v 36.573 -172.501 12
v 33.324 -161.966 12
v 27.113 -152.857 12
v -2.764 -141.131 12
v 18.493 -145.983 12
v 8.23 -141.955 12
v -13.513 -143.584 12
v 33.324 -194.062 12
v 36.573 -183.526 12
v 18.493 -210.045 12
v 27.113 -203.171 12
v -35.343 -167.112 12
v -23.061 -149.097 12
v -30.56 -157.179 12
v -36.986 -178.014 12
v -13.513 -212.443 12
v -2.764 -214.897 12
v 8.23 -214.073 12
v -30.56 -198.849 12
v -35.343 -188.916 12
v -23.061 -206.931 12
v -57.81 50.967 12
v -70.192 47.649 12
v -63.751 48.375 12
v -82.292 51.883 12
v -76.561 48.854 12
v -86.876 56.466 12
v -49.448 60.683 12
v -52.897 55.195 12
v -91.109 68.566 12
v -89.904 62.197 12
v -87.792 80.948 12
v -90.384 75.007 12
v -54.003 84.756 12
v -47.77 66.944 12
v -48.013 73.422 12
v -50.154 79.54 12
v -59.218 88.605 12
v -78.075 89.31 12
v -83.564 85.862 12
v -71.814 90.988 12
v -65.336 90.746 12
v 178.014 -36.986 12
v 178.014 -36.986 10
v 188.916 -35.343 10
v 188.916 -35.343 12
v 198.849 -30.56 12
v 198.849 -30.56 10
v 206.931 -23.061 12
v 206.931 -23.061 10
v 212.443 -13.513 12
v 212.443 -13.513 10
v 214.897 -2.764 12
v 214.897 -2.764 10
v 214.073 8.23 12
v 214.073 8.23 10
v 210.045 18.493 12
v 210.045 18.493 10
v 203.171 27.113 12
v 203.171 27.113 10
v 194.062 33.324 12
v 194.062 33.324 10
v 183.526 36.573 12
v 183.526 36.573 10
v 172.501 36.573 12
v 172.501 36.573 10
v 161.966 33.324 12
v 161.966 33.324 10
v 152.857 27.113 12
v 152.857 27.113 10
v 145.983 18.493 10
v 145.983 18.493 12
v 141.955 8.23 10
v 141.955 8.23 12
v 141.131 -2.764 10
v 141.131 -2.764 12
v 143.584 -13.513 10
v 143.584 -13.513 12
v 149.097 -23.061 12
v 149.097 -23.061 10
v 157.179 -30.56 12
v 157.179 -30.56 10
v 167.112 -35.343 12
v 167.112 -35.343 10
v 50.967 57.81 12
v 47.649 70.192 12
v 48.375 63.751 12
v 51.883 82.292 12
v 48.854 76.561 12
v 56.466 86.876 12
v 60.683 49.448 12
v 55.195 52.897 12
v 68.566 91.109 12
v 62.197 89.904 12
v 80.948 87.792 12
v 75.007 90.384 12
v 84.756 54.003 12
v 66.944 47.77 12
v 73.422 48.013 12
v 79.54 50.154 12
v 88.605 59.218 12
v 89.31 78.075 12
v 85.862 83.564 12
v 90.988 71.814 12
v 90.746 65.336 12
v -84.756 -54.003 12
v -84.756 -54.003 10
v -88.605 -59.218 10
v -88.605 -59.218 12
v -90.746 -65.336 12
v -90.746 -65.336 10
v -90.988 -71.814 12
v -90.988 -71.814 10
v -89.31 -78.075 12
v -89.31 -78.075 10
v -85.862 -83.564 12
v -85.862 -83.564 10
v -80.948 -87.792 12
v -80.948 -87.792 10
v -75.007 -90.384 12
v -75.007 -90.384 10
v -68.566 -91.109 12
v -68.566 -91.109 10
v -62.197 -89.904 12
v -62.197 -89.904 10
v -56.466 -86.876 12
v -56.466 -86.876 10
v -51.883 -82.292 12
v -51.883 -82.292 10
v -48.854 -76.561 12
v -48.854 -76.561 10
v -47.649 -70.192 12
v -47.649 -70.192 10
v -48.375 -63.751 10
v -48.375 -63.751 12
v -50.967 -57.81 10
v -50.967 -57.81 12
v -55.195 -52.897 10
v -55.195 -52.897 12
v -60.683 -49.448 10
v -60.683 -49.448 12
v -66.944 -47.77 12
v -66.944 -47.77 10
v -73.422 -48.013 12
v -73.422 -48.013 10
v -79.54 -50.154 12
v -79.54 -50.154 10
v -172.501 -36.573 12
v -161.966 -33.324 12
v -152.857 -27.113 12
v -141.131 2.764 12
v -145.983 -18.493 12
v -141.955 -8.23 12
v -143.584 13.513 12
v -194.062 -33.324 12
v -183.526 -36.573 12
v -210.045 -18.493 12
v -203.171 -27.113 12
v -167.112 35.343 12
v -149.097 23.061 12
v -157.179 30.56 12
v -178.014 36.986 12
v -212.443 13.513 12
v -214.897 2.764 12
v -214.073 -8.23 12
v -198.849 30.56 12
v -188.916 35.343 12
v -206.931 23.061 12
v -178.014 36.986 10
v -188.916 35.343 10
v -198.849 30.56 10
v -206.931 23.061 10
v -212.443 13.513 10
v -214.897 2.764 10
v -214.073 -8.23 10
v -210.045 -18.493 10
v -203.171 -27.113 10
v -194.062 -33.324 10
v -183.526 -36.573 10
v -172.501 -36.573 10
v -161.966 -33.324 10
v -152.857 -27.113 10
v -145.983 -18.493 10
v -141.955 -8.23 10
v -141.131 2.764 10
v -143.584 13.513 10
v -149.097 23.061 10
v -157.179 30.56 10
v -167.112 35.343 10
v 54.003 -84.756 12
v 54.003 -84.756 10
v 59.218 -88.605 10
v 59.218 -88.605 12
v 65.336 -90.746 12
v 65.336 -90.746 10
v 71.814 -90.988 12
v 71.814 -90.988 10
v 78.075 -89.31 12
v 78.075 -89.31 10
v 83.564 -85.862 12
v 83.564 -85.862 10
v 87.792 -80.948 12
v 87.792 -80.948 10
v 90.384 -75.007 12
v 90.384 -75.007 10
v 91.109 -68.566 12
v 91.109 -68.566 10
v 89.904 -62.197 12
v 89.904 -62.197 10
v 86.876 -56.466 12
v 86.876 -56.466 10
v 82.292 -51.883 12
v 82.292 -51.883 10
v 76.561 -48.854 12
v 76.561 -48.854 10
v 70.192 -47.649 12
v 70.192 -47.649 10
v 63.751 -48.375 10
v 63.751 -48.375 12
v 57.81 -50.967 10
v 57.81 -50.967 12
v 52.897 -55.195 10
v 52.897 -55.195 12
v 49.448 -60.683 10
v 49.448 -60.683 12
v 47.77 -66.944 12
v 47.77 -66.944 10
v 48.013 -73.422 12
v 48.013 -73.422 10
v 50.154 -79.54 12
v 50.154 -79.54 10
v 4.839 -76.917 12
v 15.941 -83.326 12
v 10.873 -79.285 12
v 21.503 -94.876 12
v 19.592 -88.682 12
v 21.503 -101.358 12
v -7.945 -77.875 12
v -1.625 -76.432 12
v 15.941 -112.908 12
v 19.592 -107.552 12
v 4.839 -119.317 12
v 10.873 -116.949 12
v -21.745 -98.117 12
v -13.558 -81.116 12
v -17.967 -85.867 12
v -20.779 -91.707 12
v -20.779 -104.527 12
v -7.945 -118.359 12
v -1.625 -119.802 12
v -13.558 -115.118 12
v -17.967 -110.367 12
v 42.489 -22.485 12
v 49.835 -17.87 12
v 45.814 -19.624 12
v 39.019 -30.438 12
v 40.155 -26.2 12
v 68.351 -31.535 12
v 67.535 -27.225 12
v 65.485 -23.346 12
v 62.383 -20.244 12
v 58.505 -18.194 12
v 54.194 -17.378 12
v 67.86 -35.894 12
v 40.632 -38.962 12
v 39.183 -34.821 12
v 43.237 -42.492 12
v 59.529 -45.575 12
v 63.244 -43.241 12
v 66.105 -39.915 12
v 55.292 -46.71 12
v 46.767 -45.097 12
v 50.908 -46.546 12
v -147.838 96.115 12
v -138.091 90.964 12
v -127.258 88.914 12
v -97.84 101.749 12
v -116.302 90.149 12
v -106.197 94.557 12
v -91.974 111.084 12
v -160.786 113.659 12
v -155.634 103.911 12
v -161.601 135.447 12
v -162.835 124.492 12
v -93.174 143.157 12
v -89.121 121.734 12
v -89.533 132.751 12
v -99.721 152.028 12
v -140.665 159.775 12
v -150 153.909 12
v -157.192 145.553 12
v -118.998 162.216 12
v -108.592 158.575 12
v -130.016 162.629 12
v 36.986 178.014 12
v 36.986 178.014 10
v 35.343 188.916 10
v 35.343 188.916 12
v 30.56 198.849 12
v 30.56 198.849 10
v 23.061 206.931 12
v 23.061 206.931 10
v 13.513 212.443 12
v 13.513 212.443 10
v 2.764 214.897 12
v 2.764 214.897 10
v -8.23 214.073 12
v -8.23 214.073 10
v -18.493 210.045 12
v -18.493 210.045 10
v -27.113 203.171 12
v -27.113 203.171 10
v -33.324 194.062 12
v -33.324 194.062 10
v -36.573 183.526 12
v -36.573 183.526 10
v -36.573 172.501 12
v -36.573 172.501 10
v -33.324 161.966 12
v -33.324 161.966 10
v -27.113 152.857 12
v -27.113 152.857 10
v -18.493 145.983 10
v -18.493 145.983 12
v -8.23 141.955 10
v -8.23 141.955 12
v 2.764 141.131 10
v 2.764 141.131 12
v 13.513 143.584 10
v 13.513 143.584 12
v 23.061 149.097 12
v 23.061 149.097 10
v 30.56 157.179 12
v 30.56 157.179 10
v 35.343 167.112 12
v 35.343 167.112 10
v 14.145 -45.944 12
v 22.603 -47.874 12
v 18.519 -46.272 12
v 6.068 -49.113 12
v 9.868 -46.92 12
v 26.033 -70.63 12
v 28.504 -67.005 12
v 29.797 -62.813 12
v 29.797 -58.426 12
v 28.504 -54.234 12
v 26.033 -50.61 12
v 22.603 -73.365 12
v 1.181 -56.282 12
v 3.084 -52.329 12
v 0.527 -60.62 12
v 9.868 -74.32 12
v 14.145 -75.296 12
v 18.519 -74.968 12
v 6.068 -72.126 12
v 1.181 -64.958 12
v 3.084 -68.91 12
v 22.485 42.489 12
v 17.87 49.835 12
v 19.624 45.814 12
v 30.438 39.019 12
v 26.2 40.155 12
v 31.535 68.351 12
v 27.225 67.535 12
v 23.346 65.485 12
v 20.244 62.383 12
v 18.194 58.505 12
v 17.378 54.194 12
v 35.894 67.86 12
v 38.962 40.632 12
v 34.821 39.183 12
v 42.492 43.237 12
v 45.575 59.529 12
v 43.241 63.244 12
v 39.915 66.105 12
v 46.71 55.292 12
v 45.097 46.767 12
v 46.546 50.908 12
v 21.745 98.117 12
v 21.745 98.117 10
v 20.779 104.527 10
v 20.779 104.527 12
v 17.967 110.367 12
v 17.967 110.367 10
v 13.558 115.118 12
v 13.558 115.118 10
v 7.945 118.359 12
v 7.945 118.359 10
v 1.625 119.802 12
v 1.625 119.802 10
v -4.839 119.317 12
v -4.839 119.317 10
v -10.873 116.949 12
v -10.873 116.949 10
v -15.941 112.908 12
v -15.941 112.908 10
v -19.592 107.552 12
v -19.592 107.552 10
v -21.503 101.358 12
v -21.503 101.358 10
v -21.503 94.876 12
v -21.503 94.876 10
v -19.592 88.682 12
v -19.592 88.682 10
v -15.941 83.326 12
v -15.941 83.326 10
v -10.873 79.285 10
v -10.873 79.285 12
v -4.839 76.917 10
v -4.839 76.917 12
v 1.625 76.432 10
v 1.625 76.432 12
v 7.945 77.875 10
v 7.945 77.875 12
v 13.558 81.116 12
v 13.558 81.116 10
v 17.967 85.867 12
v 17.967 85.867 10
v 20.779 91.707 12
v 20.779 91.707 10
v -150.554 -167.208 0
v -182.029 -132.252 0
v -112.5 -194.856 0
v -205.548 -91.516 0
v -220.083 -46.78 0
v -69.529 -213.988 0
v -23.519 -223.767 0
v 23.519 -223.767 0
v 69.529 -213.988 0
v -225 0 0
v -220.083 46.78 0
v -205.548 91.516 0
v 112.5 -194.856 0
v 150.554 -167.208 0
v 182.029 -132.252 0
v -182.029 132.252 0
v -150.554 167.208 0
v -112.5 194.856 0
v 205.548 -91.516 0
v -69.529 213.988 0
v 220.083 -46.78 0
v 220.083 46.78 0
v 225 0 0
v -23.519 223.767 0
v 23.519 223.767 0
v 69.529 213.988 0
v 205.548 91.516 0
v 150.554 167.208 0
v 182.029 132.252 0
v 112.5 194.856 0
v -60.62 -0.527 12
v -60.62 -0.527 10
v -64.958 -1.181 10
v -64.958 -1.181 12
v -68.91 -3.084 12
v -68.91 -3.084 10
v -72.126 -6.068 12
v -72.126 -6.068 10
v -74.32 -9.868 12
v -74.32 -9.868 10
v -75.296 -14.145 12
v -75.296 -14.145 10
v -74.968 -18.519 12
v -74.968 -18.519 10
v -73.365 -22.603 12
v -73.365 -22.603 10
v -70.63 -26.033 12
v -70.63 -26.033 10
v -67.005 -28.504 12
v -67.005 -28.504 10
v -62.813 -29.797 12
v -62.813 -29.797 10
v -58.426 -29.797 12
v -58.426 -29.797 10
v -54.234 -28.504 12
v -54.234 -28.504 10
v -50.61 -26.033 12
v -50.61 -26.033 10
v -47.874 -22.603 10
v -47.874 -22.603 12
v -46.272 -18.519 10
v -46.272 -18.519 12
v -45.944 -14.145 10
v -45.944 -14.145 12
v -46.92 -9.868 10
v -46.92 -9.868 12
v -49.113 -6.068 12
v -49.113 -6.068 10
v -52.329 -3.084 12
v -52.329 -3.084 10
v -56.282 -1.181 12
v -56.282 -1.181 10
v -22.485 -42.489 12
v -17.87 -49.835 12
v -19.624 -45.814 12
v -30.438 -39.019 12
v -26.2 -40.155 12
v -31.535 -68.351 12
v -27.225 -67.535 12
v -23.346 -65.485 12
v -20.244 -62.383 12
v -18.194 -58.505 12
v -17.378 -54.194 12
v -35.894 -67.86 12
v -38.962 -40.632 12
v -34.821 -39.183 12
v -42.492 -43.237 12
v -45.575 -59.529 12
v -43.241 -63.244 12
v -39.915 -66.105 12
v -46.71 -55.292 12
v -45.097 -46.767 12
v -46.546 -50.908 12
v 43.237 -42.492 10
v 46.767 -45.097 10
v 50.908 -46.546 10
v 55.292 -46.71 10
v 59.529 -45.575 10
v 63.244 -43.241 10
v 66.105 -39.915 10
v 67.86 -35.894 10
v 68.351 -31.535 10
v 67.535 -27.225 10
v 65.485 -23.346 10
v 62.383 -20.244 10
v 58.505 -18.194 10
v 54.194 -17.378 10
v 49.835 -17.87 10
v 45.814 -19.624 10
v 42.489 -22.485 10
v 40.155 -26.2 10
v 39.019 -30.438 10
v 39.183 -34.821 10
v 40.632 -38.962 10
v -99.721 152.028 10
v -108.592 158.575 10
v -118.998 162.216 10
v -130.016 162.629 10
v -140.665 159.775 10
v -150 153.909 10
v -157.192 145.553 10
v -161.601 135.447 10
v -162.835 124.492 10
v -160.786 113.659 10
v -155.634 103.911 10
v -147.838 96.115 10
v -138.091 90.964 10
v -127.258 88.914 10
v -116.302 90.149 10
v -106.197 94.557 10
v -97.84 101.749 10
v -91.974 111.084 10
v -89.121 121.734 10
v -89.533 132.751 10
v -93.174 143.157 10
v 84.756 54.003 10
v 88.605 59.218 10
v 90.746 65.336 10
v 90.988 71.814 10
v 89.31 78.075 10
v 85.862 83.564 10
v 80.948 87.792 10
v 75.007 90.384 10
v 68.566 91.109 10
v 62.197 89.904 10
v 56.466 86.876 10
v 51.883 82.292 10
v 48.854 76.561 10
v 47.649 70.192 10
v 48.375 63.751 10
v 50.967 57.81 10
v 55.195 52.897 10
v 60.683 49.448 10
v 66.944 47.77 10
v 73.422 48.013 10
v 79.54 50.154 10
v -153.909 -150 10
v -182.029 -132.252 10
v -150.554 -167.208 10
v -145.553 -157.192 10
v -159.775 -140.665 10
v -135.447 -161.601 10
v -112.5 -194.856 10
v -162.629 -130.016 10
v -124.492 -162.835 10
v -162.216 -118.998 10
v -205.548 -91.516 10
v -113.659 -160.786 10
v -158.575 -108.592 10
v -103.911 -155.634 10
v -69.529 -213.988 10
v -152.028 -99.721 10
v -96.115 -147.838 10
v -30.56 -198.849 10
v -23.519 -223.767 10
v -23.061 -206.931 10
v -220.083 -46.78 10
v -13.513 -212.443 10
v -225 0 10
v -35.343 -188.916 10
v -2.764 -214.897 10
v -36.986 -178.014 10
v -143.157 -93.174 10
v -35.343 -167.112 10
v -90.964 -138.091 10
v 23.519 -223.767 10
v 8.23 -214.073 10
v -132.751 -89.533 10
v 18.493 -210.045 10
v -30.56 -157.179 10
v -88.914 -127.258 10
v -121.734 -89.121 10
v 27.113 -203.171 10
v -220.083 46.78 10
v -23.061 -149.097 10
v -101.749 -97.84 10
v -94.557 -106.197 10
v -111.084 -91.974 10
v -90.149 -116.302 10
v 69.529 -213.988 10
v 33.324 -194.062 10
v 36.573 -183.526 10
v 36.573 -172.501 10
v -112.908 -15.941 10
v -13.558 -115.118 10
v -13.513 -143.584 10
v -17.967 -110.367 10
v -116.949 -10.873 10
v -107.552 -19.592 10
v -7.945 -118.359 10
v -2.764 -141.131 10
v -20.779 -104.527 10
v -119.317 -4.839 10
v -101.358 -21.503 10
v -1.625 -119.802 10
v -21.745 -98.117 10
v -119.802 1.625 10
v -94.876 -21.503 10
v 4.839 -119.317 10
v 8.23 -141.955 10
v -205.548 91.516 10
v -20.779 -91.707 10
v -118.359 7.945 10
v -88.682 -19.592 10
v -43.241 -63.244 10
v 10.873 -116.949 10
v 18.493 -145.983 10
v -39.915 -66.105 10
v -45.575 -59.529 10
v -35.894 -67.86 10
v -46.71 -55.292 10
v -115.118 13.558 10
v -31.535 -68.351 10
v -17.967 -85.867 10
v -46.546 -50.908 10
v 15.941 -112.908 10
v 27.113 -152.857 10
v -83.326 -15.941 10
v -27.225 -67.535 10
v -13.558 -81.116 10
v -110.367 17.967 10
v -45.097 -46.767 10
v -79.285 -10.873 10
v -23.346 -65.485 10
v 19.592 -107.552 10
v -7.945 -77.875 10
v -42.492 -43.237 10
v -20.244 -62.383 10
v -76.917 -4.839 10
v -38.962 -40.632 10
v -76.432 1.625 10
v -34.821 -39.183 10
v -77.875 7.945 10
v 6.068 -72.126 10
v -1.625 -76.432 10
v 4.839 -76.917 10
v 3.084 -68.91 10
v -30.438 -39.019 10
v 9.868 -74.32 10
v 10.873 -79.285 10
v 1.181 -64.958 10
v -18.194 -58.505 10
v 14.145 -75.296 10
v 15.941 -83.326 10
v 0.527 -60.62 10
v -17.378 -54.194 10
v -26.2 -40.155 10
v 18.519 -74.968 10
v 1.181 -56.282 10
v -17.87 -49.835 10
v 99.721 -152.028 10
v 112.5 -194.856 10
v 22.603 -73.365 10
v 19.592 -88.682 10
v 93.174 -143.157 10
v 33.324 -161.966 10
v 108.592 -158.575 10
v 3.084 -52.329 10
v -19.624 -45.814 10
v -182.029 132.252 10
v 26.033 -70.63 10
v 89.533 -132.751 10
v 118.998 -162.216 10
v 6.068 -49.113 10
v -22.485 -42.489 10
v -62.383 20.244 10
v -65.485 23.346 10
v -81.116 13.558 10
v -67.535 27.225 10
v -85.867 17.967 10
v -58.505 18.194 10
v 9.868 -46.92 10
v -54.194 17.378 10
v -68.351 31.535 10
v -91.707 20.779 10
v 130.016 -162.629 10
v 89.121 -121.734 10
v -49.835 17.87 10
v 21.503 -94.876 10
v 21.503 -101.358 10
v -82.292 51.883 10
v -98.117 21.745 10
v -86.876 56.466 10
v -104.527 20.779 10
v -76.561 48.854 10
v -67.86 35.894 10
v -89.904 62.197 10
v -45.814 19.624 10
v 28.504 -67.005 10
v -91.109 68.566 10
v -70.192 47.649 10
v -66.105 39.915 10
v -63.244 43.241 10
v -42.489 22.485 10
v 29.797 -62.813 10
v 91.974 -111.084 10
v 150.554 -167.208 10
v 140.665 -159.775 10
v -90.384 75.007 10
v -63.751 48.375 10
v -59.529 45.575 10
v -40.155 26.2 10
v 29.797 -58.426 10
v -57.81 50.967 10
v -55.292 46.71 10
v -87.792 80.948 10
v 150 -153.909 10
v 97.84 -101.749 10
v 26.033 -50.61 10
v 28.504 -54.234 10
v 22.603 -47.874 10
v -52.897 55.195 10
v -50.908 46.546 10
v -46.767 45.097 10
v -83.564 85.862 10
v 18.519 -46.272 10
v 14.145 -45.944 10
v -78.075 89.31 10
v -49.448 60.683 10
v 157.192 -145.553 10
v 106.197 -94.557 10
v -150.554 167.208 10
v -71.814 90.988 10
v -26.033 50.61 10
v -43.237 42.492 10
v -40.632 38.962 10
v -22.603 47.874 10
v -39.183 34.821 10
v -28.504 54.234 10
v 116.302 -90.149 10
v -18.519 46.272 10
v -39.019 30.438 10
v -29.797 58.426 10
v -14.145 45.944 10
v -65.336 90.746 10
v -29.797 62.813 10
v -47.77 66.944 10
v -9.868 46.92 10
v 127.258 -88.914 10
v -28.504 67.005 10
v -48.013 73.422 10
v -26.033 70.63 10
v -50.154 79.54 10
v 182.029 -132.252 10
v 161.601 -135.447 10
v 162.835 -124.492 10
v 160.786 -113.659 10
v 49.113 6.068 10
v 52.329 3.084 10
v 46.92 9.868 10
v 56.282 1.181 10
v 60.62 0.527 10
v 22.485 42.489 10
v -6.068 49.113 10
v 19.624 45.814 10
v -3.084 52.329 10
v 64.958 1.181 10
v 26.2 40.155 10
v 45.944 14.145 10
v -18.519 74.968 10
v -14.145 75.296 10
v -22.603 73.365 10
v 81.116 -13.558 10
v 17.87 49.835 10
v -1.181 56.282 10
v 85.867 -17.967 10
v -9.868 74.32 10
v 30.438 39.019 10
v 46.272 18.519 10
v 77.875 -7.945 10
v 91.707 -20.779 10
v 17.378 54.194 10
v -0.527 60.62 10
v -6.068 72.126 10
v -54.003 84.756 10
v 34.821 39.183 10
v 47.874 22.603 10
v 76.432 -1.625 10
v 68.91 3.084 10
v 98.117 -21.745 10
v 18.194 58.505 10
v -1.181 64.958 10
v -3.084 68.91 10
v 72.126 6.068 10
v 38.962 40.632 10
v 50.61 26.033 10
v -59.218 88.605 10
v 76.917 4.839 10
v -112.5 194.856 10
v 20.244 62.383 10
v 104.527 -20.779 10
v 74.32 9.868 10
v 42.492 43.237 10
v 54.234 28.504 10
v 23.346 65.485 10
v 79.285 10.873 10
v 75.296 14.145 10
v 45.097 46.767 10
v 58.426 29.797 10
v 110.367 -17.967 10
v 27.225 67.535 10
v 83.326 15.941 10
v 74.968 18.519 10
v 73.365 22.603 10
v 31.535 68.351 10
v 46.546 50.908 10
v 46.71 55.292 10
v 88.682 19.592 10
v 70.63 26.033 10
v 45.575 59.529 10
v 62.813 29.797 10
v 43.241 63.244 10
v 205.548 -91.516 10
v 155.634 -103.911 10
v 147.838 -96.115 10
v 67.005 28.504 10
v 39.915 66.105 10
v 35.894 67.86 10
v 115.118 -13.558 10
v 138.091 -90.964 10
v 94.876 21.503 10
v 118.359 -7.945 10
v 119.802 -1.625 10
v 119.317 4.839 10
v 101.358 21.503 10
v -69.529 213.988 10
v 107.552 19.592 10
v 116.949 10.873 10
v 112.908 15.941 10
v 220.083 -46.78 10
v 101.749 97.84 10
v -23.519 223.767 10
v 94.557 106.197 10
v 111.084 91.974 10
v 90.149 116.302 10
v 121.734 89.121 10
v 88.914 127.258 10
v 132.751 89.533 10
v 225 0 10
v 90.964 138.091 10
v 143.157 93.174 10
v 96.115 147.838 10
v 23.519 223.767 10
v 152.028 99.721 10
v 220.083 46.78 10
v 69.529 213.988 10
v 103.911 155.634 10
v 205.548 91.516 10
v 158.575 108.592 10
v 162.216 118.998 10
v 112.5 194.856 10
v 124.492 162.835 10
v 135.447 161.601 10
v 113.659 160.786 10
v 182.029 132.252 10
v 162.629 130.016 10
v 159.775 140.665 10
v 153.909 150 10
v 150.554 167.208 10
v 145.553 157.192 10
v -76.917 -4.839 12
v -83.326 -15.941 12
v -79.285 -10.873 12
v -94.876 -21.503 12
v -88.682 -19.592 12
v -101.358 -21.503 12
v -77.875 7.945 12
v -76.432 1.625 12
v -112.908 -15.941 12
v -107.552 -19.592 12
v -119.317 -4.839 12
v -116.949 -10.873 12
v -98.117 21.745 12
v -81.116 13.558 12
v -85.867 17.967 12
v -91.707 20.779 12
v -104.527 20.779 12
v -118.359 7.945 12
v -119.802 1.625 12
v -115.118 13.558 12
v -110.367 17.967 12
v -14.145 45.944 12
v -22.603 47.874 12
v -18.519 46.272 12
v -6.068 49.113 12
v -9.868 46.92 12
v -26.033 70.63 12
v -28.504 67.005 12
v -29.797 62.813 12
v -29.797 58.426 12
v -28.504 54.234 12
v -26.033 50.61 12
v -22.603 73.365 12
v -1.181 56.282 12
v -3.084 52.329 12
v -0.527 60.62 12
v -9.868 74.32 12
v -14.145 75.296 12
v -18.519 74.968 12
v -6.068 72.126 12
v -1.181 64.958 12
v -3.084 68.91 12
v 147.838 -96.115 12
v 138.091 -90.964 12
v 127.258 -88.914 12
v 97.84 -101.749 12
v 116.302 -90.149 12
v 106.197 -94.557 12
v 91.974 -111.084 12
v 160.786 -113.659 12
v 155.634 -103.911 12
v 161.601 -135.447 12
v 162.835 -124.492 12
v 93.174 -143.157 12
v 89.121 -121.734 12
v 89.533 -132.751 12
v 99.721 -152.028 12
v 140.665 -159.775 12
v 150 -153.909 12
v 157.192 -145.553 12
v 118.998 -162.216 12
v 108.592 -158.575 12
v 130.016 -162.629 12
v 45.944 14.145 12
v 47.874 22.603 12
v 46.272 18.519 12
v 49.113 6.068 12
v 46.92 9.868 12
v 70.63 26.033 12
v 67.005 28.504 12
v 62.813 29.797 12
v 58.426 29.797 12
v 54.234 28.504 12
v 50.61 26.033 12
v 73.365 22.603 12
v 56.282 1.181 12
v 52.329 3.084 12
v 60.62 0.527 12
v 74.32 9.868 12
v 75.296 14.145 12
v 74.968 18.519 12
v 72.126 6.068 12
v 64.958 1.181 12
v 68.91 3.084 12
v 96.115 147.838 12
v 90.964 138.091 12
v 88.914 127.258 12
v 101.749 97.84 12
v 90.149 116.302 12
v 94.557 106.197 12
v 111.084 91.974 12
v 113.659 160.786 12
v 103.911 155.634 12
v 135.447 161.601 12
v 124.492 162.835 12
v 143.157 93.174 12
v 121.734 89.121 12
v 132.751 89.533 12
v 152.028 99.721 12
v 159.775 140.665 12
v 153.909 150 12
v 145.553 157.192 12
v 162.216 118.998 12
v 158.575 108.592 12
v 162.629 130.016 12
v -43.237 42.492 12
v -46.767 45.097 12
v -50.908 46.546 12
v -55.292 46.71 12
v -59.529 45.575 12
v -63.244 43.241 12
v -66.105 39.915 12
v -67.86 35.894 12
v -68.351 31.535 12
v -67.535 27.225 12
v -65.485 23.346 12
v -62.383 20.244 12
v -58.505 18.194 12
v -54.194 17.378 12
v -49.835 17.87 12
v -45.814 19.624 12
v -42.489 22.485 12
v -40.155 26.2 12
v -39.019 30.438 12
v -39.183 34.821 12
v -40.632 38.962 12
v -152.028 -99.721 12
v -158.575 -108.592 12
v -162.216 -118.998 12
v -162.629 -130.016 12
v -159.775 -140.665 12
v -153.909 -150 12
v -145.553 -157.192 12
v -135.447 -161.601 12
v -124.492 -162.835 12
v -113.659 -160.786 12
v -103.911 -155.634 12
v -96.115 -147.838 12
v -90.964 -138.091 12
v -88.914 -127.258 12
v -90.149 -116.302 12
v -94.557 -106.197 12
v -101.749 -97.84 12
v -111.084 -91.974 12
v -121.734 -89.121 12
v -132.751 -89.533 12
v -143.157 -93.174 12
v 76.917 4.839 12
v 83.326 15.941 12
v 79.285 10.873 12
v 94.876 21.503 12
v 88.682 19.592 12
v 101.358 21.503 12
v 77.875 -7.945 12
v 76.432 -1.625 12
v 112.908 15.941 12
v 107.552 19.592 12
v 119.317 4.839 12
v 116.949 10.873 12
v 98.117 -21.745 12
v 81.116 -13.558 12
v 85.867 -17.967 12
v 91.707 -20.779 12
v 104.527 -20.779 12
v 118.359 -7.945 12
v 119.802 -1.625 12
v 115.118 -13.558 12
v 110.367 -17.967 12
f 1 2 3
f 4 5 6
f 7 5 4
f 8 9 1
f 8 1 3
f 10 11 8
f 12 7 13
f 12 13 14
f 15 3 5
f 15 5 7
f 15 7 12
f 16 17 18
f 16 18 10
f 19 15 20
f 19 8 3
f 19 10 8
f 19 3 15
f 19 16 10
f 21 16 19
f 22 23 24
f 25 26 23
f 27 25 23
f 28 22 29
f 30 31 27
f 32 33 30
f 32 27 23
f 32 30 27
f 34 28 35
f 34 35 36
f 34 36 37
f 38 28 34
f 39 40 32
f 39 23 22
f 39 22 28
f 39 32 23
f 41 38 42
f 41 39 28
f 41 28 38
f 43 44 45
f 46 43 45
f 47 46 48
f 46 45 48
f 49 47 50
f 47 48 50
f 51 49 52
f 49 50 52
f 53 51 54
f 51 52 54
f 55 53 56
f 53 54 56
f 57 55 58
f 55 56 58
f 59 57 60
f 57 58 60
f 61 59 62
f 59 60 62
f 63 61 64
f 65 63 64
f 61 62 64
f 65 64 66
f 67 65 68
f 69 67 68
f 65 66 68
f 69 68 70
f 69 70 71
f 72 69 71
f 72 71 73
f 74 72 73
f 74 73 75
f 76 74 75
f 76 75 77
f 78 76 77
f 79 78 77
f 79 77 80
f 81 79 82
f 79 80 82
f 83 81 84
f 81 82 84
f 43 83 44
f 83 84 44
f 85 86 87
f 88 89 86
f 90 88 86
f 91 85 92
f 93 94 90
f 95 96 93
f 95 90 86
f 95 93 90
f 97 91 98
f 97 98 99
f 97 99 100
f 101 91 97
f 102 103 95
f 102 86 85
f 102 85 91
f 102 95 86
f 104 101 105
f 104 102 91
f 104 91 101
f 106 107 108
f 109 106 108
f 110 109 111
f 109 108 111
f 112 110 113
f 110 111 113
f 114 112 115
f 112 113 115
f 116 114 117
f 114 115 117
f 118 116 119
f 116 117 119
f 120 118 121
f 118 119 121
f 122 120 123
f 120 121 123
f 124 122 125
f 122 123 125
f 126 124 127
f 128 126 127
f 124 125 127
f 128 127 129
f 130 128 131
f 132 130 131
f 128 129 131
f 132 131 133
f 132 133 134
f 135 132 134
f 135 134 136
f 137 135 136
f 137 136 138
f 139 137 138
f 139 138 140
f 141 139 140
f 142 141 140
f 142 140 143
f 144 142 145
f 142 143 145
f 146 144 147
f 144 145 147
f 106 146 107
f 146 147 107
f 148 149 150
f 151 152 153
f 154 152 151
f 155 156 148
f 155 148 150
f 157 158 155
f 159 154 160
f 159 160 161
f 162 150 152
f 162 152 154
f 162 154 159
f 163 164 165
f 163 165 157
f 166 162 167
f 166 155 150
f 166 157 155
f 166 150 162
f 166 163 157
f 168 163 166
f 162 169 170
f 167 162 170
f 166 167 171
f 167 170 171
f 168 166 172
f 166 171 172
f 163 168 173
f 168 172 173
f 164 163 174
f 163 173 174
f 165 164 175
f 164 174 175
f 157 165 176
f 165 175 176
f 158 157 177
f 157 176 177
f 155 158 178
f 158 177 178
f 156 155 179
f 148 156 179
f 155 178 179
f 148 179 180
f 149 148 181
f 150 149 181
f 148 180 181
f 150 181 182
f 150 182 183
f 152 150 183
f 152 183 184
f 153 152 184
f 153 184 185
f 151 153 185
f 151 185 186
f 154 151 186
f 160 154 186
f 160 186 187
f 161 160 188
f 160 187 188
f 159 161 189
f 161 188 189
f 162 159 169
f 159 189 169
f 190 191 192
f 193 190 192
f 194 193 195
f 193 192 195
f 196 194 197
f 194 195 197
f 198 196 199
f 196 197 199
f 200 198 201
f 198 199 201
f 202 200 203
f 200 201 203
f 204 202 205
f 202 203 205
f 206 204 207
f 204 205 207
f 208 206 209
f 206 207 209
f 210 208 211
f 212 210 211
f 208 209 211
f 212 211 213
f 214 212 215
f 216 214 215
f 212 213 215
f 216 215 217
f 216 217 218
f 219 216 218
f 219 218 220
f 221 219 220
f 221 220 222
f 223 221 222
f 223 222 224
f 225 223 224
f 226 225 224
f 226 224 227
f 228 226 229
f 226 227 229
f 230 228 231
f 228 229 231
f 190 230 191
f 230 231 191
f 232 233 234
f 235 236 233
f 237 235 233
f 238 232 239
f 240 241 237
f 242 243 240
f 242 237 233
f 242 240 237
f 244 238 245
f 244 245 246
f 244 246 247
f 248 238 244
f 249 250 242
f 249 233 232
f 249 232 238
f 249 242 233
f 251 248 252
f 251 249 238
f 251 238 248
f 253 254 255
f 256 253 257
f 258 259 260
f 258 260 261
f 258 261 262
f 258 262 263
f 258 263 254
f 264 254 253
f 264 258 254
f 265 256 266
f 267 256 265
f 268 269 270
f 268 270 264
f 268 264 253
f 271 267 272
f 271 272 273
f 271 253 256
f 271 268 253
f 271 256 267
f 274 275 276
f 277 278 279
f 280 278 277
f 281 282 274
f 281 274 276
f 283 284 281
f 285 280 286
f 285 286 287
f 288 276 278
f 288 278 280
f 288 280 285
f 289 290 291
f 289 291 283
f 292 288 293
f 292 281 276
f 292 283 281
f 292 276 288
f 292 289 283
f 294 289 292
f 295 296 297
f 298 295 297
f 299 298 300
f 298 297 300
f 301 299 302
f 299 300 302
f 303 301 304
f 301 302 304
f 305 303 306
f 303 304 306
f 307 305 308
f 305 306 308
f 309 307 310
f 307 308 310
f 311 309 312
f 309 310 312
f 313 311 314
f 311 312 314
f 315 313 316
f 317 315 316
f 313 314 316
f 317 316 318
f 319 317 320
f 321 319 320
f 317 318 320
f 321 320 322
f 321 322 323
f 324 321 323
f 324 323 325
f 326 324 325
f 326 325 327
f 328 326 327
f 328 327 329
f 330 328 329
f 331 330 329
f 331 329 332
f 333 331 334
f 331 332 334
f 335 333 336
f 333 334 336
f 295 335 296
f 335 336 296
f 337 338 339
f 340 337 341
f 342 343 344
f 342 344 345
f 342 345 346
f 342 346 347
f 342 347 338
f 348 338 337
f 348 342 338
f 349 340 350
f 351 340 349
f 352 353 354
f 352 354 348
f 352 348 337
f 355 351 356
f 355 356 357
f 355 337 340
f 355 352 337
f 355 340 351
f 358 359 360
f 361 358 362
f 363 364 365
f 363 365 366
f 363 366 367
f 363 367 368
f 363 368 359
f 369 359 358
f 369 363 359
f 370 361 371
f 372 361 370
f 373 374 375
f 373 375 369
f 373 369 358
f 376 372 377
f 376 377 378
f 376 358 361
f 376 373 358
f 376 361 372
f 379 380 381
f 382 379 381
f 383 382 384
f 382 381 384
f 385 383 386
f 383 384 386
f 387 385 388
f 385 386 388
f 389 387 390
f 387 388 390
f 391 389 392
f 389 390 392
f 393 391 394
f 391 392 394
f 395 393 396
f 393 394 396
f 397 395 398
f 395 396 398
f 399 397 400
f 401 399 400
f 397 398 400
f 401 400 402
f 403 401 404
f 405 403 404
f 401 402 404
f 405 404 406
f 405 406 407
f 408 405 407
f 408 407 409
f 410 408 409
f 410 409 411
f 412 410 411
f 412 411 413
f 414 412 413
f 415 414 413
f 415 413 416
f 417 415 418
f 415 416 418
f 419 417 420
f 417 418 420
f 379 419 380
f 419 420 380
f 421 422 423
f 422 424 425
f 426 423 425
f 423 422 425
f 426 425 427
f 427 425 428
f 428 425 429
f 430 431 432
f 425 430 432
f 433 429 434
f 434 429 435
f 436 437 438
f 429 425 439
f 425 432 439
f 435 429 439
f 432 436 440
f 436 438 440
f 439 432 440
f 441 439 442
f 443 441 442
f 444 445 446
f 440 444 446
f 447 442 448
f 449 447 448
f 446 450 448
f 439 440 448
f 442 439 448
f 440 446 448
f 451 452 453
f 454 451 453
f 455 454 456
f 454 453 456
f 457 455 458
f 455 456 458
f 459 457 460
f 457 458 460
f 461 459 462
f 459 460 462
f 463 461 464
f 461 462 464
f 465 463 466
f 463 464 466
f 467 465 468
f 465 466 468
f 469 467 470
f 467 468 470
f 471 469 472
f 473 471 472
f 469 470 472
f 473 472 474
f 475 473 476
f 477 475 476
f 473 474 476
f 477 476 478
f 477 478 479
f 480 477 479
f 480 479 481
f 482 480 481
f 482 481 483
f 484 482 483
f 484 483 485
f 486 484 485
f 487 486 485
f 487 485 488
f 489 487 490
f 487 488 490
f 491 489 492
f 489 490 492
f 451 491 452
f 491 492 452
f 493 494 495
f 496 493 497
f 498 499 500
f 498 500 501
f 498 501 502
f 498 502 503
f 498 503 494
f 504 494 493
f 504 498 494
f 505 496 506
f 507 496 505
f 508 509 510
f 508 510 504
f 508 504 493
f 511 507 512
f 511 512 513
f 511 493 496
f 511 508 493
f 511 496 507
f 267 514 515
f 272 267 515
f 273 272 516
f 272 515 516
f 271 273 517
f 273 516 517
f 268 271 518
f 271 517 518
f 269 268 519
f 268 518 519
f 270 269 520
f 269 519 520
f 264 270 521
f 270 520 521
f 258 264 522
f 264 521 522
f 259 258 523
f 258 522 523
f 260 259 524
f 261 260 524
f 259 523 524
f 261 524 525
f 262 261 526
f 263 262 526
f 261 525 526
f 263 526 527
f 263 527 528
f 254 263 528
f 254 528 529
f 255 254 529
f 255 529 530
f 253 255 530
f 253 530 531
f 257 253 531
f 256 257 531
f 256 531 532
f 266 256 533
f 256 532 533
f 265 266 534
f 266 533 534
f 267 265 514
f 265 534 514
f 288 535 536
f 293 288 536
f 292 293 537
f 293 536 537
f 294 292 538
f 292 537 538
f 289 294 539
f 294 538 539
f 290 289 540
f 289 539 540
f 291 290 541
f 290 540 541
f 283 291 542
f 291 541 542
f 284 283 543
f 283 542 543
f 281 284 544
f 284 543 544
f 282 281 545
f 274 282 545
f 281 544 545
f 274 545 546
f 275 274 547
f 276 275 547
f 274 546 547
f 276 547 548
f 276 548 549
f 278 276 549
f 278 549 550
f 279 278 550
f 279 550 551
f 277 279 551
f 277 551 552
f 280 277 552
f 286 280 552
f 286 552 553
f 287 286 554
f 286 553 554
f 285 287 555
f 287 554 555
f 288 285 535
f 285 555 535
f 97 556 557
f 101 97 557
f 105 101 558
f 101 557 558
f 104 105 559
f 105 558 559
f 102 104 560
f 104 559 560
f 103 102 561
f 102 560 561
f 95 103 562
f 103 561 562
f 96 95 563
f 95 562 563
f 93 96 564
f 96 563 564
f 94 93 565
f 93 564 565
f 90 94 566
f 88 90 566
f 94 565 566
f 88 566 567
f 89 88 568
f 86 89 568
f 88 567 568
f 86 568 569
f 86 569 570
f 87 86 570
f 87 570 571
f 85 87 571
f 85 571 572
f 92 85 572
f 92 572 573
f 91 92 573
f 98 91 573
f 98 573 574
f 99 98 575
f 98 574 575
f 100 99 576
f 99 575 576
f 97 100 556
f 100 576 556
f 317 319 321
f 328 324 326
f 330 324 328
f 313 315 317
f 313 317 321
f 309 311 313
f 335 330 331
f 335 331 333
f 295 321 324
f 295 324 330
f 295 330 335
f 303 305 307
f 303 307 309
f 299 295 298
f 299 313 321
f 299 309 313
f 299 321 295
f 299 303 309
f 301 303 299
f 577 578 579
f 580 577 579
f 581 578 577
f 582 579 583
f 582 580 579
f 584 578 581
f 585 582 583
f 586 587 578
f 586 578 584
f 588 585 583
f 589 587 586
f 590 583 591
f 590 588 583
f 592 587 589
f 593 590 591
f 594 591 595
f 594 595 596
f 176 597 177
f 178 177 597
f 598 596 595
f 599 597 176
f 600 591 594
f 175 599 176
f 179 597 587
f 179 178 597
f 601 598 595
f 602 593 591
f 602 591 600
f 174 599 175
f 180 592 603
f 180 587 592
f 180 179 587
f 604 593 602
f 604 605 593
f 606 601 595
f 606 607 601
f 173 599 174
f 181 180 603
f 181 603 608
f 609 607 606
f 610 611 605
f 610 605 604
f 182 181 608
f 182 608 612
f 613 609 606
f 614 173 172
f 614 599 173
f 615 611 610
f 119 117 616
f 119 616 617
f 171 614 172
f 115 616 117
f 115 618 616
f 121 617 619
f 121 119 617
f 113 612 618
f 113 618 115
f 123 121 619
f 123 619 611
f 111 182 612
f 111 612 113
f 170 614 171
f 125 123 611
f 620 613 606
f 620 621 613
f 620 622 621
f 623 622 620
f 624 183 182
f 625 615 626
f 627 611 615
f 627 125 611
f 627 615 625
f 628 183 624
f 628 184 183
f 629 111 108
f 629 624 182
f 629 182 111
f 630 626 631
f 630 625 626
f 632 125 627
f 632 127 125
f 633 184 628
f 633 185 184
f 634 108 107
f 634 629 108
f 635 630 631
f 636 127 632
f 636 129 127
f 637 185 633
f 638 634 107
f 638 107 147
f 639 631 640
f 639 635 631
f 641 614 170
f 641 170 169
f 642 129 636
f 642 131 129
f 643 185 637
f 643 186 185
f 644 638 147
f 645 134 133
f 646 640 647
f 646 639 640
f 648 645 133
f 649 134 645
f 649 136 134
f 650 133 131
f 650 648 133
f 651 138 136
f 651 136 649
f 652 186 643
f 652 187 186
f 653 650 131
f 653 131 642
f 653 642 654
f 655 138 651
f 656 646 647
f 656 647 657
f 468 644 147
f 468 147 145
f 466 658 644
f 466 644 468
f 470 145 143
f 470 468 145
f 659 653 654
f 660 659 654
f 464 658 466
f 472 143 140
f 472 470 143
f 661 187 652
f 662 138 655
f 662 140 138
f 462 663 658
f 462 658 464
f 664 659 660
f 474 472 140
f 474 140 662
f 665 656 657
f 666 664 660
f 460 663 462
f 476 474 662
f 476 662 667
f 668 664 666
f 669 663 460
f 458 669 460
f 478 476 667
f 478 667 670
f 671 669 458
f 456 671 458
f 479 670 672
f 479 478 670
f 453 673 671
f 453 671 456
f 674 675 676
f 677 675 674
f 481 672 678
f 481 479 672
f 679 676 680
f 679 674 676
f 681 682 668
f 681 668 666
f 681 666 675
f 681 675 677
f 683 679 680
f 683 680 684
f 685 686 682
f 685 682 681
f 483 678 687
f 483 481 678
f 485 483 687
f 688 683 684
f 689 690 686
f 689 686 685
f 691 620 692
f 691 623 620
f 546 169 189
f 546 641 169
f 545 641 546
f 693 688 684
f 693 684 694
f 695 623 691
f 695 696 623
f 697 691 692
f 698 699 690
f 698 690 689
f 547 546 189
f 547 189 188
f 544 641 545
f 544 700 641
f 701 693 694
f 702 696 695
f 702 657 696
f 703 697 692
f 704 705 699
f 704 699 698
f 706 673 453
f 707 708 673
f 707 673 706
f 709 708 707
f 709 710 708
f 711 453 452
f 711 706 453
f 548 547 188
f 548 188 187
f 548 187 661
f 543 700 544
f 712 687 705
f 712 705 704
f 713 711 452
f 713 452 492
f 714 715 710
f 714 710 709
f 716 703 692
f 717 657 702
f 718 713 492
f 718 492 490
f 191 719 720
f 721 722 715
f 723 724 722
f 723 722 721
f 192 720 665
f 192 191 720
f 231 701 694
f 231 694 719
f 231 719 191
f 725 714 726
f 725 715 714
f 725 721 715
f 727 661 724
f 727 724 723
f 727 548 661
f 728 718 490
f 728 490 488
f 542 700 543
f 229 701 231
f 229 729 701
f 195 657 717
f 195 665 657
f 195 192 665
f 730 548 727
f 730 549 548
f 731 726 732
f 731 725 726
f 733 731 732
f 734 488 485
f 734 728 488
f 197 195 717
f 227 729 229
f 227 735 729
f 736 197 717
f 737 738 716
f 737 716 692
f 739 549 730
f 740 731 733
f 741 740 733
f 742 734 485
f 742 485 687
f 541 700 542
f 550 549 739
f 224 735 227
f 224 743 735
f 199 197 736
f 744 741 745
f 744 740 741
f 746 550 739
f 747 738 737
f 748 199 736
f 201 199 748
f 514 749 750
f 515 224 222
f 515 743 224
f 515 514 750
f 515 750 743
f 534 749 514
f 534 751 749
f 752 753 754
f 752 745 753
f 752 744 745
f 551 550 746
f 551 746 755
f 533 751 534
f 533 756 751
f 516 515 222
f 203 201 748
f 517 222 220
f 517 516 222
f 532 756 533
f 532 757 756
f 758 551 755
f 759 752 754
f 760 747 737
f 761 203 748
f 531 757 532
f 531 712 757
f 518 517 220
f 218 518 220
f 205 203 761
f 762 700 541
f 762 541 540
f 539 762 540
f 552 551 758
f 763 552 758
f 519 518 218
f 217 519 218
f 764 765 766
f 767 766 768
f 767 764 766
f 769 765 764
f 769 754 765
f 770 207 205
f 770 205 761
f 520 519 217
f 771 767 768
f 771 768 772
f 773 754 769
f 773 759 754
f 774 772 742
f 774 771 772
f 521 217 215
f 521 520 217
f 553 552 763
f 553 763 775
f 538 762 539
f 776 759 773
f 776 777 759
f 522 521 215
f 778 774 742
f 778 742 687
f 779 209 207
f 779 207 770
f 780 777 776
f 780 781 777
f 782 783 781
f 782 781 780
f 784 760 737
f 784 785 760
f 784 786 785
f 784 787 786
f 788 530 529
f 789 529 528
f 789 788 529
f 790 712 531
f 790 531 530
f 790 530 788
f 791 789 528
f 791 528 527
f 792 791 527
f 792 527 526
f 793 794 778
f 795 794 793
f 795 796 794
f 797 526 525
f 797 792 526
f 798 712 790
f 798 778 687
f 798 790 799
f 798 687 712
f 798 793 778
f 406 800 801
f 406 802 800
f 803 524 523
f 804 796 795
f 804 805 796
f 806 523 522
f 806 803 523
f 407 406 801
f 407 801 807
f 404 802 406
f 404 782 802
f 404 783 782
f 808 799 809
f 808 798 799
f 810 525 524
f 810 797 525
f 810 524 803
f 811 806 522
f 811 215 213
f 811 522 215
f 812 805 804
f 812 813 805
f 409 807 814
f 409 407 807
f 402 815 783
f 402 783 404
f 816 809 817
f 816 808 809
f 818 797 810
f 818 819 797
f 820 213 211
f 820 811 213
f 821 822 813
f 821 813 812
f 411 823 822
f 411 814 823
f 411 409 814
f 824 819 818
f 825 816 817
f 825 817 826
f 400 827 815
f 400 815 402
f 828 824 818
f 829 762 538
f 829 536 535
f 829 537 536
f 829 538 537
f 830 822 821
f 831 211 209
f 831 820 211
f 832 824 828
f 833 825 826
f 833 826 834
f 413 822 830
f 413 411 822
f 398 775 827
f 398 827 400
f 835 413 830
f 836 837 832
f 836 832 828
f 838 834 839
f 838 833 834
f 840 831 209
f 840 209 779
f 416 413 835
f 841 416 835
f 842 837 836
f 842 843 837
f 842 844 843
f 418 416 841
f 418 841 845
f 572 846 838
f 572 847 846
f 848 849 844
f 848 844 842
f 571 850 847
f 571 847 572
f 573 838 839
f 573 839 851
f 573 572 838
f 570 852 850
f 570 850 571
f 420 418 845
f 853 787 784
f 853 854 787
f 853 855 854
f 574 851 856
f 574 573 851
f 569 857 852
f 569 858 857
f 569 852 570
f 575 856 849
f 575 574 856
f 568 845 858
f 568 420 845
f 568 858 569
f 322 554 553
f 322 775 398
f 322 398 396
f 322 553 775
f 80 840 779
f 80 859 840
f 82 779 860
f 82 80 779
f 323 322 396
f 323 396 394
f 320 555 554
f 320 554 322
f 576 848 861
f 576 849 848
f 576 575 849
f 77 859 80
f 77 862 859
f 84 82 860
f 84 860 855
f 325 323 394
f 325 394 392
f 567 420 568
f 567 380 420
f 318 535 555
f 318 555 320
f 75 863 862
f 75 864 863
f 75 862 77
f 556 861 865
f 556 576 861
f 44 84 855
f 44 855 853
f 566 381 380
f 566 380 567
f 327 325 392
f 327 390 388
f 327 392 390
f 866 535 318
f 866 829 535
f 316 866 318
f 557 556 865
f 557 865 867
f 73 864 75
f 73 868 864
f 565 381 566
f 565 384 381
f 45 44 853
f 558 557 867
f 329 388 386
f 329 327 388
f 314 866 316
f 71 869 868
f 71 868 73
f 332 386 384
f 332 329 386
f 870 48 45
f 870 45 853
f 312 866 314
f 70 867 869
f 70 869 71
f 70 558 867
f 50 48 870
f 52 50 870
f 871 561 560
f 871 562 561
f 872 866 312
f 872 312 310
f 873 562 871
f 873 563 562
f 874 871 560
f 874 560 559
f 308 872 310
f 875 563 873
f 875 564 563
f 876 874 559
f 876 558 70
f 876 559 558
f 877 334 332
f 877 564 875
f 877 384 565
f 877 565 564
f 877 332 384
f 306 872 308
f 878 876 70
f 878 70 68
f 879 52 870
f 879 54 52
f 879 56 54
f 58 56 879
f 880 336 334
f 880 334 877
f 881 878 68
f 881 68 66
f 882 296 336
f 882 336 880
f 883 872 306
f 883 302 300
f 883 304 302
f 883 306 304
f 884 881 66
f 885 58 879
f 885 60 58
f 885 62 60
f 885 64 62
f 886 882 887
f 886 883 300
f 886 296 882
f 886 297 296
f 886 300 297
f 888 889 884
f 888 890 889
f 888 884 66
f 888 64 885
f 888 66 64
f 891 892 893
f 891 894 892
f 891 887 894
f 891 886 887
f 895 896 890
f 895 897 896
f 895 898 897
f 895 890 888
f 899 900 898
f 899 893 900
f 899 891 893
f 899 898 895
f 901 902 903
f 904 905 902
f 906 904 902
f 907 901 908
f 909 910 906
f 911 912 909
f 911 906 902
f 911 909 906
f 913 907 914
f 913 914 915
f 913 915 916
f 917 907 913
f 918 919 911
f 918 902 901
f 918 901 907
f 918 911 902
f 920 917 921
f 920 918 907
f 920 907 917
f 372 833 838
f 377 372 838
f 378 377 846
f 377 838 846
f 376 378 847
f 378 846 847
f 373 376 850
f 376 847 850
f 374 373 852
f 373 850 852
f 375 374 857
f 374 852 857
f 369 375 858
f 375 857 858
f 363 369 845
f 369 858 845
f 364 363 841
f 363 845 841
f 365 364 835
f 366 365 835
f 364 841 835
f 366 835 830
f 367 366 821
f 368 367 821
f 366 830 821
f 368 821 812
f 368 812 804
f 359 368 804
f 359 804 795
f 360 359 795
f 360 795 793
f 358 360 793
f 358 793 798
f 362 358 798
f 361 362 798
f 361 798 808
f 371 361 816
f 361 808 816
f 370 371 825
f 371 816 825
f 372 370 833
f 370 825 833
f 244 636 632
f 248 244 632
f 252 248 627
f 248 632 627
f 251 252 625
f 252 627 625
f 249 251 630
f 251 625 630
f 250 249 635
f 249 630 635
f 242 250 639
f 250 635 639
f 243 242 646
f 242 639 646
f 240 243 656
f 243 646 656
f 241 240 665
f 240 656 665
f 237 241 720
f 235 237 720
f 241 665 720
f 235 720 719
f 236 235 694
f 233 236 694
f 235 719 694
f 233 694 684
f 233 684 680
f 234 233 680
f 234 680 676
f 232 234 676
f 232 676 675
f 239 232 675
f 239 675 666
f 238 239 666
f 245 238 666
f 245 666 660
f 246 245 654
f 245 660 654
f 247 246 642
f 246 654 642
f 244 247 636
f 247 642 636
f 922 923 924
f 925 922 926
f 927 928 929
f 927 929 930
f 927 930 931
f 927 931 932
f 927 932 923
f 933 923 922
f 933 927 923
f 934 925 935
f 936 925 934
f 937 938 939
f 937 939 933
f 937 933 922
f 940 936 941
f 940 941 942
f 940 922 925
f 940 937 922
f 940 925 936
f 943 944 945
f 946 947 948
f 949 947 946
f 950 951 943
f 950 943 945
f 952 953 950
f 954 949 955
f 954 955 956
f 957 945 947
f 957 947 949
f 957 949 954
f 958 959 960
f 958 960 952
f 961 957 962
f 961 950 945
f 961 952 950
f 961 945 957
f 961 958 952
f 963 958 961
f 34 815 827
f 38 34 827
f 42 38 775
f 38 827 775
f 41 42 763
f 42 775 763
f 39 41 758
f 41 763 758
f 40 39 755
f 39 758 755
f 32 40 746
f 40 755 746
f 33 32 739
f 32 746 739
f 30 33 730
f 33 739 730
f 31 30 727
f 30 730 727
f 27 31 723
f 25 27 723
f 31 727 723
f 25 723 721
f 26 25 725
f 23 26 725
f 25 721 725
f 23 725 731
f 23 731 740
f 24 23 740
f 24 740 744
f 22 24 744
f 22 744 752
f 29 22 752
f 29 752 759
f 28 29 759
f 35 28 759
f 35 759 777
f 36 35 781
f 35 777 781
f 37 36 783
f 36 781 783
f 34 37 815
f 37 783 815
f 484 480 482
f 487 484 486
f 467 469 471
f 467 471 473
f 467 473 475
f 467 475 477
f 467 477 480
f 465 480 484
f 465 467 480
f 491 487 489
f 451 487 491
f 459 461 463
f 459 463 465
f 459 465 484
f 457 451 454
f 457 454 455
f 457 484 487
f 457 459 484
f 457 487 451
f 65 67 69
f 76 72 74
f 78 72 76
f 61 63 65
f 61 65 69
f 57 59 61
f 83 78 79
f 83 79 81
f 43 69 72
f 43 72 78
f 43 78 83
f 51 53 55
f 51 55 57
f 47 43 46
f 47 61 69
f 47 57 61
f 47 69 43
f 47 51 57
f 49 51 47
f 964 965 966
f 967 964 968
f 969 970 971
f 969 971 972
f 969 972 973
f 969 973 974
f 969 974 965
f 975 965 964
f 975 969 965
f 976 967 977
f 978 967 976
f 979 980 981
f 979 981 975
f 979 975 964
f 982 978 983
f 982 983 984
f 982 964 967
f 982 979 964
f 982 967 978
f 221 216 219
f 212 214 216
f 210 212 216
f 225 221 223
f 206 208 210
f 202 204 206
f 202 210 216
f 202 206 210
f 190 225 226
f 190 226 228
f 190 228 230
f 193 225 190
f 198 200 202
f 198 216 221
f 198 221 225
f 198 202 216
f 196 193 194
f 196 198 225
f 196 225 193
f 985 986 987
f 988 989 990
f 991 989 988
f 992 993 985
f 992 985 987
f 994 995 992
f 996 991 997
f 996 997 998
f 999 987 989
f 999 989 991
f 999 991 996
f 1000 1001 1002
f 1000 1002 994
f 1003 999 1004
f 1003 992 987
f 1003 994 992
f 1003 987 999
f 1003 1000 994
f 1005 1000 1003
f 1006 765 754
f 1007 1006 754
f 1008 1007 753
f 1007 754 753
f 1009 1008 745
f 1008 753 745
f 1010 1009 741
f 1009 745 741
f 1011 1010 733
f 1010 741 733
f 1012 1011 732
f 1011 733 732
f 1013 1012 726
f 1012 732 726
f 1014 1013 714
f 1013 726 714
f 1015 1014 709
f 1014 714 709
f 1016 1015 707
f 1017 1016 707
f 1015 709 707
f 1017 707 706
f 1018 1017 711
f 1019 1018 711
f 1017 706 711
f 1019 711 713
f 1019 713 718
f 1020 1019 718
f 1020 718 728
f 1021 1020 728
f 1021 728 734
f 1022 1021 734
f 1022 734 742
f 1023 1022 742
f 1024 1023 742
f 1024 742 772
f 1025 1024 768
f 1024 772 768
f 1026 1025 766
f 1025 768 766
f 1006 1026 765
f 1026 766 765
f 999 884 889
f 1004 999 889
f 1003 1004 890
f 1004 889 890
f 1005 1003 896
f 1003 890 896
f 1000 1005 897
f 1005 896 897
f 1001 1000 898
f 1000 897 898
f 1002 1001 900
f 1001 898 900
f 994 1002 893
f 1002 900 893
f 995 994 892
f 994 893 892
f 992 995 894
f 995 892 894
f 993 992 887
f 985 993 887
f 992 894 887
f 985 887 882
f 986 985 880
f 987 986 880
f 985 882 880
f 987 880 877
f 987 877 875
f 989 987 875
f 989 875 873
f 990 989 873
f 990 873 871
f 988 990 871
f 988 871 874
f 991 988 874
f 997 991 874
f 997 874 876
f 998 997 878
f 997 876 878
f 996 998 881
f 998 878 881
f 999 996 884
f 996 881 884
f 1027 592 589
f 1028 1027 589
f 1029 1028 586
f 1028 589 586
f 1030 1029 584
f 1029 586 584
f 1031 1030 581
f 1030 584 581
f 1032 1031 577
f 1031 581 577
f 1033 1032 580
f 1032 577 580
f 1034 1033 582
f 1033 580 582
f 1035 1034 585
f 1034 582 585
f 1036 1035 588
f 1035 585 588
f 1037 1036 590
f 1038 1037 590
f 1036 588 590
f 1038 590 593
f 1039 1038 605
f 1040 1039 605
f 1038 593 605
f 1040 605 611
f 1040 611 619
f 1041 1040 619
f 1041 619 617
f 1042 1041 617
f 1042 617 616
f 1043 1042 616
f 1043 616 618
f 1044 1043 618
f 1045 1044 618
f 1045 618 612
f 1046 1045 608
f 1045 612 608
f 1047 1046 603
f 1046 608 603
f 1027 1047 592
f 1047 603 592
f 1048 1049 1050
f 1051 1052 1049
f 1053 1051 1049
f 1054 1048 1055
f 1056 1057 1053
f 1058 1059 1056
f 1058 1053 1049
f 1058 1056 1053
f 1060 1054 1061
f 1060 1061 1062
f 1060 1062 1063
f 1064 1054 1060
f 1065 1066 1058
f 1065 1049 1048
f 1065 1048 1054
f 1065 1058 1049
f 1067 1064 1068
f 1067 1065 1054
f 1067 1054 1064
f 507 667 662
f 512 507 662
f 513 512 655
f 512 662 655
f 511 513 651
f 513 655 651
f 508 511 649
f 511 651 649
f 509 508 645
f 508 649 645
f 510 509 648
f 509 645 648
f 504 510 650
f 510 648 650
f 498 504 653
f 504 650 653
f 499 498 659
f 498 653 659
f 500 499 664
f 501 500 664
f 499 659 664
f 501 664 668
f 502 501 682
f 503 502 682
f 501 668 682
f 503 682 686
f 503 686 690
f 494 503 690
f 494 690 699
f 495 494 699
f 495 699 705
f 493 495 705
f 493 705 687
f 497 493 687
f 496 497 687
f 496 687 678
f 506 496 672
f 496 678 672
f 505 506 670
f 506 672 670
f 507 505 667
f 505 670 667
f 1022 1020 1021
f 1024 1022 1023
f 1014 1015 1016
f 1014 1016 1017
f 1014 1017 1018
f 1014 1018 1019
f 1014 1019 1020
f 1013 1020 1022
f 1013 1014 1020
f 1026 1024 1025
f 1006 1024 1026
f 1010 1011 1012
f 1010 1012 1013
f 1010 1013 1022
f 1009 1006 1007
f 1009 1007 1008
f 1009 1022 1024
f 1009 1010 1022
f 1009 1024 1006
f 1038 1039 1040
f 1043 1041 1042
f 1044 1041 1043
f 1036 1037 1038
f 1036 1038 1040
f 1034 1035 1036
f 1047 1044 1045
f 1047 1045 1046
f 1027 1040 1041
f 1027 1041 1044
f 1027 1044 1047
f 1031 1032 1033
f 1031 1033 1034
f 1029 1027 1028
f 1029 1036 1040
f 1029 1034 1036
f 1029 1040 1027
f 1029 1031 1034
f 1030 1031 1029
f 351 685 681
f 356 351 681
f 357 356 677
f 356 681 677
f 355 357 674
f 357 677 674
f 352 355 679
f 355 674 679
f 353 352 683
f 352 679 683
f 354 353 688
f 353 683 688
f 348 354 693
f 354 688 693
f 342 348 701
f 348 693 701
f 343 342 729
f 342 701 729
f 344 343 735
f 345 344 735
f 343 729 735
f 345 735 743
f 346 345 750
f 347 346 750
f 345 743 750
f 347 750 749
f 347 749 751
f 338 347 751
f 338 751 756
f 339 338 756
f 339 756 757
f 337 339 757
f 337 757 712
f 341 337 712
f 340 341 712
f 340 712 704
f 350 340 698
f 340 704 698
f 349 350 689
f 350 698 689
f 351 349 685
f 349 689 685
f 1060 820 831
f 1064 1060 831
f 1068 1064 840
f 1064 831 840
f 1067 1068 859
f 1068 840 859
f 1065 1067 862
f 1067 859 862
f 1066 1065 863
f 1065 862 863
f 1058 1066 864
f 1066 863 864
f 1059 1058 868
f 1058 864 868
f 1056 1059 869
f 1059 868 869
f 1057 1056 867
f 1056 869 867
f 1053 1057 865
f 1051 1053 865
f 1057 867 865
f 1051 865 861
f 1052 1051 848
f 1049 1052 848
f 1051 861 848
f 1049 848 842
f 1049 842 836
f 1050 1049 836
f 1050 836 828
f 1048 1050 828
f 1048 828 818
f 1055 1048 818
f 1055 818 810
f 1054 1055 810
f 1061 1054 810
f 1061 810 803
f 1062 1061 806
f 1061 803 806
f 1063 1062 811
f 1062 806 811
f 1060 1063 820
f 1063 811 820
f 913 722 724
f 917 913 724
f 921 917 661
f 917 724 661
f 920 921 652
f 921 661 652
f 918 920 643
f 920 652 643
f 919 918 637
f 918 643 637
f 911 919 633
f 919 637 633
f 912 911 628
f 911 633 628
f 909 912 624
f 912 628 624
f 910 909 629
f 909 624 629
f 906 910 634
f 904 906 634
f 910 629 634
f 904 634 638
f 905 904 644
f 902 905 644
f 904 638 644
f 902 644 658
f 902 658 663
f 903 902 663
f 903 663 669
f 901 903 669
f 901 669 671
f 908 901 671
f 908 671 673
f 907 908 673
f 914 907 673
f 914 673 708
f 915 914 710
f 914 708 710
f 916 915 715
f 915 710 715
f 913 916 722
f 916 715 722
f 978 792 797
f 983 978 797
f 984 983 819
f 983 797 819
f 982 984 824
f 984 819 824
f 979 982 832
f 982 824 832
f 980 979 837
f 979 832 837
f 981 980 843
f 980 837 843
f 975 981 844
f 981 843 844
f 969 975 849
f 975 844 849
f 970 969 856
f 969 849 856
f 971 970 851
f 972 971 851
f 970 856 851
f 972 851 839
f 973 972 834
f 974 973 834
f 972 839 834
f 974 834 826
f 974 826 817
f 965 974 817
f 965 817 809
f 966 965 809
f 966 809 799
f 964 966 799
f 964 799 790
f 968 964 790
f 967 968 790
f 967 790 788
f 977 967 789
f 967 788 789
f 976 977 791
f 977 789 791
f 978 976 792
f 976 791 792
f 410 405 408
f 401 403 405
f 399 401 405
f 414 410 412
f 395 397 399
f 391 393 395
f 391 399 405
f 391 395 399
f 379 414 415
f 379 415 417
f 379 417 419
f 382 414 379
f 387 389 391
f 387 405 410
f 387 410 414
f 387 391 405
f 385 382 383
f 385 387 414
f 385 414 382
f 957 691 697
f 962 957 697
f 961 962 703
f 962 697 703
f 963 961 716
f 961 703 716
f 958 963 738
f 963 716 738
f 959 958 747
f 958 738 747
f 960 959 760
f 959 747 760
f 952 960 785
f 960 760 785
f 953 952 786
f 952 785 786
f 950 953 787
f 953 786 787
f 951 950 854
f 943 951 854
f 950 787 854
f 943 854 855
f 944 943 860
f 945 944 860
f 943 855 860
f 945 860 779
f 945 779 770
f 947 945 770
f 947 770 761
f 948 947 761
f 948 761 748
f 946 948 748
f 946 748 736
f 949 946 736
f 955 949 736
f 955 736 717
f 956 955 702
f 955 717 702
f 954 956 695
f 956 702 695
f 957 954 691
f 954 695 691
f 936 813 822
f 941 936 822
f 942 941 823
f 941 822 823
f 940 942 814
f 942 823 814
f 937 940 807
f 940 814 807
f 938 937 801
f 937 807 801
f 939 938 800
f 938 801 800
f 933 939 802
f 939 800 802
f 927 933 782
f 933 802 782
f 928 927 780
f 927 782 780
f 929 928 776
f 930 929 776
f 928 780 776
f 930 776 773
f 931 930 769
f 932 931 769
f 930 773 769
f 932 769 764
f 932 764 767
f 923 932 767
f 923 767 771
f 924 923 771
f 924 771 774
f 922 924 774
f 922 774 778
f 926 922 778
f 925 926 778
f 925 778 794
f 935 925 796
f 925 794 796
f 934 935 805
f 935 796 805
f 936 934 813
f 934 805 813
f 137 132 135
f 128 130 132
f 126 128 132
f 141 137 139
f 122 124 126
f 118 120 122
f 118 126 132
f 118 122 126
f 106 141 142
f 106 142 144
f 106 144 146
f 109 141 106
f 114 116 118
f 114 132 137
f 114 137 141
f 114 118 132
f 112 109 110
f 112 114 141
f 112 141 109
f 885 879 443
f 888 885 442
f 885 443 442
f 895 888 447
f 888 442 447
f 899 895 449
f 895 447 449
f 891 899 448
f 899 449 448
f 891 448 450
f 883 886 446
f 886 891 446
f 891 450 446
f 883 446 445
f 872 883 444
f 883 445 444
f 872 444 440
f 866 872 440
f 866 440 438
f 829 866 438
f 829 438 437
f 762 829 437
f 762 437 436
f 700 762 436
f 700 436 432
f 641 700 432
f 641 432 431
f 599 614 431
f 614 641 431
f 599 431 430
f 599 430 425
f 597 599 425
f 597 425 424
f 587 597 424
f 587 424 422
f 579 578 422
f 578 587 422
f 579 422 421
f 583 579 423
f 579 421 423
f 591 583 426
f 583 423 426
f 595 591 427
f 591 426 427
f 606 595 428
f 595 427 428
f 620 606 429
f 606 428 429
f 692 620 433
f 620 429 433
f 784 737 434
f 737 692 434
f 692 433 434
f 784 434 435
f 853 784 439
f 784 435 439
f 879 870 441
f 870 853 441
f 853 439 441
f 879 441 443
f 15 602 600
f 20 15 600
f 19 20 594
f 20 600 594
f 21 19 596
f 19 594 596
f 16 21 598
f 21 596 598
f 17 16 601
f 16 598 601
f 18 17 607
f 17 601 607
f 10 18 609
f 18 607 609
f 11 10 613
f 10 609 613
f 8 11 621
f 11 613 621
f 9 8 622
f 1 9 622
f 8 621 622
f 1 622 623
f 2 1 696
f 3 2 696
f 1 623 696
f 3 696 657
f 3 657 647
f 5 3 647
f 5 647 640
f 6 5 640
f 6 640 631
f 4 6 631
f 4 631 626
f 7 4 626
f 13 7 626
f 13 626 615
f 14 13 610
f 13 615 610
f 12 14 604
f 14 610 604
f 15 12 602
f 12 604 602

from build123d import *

# Parameters (mm, degrees)
F0_R     = 225
F1_DEPTH = 10
F2_R     = 36.9864384412
F2_R_2   = 21.7454824125
F2_R_3   = 14.7171600395
F3_DEPTH = 2
F5_COUNT = 8


with BuildPart() as f1:
    # F0 (on Top) → F1 (new body)
    with BuildSketch(Plane.XY):
        Circle(F0_R)
    extrude(amount=F1_DEPTH)

    # F2 (on face) → F3 (join)
    with BuildSketch(Plane.XY.offset(10)):
        with Locations((0, 178.0137121677)):
            Circle(F2_R)
        with Locations((0, 98.1170013547)):
            Circle(F2_R_2)
        with Locations((-15.2443298139, 60.619816184)):
            Circle(F2_R_3)
    extrude(amount=F3_DEPTH)

    # F5: F1 ×8 about axis
    f5_axis = Axis((0, 0, 41.8870747089), (0, 0, 1))


with BuildPart() as f1_1:
    add(f1.part)
    for i in range(1, F5_COUNT):
        add(f1.part.rotate(f5_axis, i * 360 / F5_COUNT))


solid = f1_1.part
